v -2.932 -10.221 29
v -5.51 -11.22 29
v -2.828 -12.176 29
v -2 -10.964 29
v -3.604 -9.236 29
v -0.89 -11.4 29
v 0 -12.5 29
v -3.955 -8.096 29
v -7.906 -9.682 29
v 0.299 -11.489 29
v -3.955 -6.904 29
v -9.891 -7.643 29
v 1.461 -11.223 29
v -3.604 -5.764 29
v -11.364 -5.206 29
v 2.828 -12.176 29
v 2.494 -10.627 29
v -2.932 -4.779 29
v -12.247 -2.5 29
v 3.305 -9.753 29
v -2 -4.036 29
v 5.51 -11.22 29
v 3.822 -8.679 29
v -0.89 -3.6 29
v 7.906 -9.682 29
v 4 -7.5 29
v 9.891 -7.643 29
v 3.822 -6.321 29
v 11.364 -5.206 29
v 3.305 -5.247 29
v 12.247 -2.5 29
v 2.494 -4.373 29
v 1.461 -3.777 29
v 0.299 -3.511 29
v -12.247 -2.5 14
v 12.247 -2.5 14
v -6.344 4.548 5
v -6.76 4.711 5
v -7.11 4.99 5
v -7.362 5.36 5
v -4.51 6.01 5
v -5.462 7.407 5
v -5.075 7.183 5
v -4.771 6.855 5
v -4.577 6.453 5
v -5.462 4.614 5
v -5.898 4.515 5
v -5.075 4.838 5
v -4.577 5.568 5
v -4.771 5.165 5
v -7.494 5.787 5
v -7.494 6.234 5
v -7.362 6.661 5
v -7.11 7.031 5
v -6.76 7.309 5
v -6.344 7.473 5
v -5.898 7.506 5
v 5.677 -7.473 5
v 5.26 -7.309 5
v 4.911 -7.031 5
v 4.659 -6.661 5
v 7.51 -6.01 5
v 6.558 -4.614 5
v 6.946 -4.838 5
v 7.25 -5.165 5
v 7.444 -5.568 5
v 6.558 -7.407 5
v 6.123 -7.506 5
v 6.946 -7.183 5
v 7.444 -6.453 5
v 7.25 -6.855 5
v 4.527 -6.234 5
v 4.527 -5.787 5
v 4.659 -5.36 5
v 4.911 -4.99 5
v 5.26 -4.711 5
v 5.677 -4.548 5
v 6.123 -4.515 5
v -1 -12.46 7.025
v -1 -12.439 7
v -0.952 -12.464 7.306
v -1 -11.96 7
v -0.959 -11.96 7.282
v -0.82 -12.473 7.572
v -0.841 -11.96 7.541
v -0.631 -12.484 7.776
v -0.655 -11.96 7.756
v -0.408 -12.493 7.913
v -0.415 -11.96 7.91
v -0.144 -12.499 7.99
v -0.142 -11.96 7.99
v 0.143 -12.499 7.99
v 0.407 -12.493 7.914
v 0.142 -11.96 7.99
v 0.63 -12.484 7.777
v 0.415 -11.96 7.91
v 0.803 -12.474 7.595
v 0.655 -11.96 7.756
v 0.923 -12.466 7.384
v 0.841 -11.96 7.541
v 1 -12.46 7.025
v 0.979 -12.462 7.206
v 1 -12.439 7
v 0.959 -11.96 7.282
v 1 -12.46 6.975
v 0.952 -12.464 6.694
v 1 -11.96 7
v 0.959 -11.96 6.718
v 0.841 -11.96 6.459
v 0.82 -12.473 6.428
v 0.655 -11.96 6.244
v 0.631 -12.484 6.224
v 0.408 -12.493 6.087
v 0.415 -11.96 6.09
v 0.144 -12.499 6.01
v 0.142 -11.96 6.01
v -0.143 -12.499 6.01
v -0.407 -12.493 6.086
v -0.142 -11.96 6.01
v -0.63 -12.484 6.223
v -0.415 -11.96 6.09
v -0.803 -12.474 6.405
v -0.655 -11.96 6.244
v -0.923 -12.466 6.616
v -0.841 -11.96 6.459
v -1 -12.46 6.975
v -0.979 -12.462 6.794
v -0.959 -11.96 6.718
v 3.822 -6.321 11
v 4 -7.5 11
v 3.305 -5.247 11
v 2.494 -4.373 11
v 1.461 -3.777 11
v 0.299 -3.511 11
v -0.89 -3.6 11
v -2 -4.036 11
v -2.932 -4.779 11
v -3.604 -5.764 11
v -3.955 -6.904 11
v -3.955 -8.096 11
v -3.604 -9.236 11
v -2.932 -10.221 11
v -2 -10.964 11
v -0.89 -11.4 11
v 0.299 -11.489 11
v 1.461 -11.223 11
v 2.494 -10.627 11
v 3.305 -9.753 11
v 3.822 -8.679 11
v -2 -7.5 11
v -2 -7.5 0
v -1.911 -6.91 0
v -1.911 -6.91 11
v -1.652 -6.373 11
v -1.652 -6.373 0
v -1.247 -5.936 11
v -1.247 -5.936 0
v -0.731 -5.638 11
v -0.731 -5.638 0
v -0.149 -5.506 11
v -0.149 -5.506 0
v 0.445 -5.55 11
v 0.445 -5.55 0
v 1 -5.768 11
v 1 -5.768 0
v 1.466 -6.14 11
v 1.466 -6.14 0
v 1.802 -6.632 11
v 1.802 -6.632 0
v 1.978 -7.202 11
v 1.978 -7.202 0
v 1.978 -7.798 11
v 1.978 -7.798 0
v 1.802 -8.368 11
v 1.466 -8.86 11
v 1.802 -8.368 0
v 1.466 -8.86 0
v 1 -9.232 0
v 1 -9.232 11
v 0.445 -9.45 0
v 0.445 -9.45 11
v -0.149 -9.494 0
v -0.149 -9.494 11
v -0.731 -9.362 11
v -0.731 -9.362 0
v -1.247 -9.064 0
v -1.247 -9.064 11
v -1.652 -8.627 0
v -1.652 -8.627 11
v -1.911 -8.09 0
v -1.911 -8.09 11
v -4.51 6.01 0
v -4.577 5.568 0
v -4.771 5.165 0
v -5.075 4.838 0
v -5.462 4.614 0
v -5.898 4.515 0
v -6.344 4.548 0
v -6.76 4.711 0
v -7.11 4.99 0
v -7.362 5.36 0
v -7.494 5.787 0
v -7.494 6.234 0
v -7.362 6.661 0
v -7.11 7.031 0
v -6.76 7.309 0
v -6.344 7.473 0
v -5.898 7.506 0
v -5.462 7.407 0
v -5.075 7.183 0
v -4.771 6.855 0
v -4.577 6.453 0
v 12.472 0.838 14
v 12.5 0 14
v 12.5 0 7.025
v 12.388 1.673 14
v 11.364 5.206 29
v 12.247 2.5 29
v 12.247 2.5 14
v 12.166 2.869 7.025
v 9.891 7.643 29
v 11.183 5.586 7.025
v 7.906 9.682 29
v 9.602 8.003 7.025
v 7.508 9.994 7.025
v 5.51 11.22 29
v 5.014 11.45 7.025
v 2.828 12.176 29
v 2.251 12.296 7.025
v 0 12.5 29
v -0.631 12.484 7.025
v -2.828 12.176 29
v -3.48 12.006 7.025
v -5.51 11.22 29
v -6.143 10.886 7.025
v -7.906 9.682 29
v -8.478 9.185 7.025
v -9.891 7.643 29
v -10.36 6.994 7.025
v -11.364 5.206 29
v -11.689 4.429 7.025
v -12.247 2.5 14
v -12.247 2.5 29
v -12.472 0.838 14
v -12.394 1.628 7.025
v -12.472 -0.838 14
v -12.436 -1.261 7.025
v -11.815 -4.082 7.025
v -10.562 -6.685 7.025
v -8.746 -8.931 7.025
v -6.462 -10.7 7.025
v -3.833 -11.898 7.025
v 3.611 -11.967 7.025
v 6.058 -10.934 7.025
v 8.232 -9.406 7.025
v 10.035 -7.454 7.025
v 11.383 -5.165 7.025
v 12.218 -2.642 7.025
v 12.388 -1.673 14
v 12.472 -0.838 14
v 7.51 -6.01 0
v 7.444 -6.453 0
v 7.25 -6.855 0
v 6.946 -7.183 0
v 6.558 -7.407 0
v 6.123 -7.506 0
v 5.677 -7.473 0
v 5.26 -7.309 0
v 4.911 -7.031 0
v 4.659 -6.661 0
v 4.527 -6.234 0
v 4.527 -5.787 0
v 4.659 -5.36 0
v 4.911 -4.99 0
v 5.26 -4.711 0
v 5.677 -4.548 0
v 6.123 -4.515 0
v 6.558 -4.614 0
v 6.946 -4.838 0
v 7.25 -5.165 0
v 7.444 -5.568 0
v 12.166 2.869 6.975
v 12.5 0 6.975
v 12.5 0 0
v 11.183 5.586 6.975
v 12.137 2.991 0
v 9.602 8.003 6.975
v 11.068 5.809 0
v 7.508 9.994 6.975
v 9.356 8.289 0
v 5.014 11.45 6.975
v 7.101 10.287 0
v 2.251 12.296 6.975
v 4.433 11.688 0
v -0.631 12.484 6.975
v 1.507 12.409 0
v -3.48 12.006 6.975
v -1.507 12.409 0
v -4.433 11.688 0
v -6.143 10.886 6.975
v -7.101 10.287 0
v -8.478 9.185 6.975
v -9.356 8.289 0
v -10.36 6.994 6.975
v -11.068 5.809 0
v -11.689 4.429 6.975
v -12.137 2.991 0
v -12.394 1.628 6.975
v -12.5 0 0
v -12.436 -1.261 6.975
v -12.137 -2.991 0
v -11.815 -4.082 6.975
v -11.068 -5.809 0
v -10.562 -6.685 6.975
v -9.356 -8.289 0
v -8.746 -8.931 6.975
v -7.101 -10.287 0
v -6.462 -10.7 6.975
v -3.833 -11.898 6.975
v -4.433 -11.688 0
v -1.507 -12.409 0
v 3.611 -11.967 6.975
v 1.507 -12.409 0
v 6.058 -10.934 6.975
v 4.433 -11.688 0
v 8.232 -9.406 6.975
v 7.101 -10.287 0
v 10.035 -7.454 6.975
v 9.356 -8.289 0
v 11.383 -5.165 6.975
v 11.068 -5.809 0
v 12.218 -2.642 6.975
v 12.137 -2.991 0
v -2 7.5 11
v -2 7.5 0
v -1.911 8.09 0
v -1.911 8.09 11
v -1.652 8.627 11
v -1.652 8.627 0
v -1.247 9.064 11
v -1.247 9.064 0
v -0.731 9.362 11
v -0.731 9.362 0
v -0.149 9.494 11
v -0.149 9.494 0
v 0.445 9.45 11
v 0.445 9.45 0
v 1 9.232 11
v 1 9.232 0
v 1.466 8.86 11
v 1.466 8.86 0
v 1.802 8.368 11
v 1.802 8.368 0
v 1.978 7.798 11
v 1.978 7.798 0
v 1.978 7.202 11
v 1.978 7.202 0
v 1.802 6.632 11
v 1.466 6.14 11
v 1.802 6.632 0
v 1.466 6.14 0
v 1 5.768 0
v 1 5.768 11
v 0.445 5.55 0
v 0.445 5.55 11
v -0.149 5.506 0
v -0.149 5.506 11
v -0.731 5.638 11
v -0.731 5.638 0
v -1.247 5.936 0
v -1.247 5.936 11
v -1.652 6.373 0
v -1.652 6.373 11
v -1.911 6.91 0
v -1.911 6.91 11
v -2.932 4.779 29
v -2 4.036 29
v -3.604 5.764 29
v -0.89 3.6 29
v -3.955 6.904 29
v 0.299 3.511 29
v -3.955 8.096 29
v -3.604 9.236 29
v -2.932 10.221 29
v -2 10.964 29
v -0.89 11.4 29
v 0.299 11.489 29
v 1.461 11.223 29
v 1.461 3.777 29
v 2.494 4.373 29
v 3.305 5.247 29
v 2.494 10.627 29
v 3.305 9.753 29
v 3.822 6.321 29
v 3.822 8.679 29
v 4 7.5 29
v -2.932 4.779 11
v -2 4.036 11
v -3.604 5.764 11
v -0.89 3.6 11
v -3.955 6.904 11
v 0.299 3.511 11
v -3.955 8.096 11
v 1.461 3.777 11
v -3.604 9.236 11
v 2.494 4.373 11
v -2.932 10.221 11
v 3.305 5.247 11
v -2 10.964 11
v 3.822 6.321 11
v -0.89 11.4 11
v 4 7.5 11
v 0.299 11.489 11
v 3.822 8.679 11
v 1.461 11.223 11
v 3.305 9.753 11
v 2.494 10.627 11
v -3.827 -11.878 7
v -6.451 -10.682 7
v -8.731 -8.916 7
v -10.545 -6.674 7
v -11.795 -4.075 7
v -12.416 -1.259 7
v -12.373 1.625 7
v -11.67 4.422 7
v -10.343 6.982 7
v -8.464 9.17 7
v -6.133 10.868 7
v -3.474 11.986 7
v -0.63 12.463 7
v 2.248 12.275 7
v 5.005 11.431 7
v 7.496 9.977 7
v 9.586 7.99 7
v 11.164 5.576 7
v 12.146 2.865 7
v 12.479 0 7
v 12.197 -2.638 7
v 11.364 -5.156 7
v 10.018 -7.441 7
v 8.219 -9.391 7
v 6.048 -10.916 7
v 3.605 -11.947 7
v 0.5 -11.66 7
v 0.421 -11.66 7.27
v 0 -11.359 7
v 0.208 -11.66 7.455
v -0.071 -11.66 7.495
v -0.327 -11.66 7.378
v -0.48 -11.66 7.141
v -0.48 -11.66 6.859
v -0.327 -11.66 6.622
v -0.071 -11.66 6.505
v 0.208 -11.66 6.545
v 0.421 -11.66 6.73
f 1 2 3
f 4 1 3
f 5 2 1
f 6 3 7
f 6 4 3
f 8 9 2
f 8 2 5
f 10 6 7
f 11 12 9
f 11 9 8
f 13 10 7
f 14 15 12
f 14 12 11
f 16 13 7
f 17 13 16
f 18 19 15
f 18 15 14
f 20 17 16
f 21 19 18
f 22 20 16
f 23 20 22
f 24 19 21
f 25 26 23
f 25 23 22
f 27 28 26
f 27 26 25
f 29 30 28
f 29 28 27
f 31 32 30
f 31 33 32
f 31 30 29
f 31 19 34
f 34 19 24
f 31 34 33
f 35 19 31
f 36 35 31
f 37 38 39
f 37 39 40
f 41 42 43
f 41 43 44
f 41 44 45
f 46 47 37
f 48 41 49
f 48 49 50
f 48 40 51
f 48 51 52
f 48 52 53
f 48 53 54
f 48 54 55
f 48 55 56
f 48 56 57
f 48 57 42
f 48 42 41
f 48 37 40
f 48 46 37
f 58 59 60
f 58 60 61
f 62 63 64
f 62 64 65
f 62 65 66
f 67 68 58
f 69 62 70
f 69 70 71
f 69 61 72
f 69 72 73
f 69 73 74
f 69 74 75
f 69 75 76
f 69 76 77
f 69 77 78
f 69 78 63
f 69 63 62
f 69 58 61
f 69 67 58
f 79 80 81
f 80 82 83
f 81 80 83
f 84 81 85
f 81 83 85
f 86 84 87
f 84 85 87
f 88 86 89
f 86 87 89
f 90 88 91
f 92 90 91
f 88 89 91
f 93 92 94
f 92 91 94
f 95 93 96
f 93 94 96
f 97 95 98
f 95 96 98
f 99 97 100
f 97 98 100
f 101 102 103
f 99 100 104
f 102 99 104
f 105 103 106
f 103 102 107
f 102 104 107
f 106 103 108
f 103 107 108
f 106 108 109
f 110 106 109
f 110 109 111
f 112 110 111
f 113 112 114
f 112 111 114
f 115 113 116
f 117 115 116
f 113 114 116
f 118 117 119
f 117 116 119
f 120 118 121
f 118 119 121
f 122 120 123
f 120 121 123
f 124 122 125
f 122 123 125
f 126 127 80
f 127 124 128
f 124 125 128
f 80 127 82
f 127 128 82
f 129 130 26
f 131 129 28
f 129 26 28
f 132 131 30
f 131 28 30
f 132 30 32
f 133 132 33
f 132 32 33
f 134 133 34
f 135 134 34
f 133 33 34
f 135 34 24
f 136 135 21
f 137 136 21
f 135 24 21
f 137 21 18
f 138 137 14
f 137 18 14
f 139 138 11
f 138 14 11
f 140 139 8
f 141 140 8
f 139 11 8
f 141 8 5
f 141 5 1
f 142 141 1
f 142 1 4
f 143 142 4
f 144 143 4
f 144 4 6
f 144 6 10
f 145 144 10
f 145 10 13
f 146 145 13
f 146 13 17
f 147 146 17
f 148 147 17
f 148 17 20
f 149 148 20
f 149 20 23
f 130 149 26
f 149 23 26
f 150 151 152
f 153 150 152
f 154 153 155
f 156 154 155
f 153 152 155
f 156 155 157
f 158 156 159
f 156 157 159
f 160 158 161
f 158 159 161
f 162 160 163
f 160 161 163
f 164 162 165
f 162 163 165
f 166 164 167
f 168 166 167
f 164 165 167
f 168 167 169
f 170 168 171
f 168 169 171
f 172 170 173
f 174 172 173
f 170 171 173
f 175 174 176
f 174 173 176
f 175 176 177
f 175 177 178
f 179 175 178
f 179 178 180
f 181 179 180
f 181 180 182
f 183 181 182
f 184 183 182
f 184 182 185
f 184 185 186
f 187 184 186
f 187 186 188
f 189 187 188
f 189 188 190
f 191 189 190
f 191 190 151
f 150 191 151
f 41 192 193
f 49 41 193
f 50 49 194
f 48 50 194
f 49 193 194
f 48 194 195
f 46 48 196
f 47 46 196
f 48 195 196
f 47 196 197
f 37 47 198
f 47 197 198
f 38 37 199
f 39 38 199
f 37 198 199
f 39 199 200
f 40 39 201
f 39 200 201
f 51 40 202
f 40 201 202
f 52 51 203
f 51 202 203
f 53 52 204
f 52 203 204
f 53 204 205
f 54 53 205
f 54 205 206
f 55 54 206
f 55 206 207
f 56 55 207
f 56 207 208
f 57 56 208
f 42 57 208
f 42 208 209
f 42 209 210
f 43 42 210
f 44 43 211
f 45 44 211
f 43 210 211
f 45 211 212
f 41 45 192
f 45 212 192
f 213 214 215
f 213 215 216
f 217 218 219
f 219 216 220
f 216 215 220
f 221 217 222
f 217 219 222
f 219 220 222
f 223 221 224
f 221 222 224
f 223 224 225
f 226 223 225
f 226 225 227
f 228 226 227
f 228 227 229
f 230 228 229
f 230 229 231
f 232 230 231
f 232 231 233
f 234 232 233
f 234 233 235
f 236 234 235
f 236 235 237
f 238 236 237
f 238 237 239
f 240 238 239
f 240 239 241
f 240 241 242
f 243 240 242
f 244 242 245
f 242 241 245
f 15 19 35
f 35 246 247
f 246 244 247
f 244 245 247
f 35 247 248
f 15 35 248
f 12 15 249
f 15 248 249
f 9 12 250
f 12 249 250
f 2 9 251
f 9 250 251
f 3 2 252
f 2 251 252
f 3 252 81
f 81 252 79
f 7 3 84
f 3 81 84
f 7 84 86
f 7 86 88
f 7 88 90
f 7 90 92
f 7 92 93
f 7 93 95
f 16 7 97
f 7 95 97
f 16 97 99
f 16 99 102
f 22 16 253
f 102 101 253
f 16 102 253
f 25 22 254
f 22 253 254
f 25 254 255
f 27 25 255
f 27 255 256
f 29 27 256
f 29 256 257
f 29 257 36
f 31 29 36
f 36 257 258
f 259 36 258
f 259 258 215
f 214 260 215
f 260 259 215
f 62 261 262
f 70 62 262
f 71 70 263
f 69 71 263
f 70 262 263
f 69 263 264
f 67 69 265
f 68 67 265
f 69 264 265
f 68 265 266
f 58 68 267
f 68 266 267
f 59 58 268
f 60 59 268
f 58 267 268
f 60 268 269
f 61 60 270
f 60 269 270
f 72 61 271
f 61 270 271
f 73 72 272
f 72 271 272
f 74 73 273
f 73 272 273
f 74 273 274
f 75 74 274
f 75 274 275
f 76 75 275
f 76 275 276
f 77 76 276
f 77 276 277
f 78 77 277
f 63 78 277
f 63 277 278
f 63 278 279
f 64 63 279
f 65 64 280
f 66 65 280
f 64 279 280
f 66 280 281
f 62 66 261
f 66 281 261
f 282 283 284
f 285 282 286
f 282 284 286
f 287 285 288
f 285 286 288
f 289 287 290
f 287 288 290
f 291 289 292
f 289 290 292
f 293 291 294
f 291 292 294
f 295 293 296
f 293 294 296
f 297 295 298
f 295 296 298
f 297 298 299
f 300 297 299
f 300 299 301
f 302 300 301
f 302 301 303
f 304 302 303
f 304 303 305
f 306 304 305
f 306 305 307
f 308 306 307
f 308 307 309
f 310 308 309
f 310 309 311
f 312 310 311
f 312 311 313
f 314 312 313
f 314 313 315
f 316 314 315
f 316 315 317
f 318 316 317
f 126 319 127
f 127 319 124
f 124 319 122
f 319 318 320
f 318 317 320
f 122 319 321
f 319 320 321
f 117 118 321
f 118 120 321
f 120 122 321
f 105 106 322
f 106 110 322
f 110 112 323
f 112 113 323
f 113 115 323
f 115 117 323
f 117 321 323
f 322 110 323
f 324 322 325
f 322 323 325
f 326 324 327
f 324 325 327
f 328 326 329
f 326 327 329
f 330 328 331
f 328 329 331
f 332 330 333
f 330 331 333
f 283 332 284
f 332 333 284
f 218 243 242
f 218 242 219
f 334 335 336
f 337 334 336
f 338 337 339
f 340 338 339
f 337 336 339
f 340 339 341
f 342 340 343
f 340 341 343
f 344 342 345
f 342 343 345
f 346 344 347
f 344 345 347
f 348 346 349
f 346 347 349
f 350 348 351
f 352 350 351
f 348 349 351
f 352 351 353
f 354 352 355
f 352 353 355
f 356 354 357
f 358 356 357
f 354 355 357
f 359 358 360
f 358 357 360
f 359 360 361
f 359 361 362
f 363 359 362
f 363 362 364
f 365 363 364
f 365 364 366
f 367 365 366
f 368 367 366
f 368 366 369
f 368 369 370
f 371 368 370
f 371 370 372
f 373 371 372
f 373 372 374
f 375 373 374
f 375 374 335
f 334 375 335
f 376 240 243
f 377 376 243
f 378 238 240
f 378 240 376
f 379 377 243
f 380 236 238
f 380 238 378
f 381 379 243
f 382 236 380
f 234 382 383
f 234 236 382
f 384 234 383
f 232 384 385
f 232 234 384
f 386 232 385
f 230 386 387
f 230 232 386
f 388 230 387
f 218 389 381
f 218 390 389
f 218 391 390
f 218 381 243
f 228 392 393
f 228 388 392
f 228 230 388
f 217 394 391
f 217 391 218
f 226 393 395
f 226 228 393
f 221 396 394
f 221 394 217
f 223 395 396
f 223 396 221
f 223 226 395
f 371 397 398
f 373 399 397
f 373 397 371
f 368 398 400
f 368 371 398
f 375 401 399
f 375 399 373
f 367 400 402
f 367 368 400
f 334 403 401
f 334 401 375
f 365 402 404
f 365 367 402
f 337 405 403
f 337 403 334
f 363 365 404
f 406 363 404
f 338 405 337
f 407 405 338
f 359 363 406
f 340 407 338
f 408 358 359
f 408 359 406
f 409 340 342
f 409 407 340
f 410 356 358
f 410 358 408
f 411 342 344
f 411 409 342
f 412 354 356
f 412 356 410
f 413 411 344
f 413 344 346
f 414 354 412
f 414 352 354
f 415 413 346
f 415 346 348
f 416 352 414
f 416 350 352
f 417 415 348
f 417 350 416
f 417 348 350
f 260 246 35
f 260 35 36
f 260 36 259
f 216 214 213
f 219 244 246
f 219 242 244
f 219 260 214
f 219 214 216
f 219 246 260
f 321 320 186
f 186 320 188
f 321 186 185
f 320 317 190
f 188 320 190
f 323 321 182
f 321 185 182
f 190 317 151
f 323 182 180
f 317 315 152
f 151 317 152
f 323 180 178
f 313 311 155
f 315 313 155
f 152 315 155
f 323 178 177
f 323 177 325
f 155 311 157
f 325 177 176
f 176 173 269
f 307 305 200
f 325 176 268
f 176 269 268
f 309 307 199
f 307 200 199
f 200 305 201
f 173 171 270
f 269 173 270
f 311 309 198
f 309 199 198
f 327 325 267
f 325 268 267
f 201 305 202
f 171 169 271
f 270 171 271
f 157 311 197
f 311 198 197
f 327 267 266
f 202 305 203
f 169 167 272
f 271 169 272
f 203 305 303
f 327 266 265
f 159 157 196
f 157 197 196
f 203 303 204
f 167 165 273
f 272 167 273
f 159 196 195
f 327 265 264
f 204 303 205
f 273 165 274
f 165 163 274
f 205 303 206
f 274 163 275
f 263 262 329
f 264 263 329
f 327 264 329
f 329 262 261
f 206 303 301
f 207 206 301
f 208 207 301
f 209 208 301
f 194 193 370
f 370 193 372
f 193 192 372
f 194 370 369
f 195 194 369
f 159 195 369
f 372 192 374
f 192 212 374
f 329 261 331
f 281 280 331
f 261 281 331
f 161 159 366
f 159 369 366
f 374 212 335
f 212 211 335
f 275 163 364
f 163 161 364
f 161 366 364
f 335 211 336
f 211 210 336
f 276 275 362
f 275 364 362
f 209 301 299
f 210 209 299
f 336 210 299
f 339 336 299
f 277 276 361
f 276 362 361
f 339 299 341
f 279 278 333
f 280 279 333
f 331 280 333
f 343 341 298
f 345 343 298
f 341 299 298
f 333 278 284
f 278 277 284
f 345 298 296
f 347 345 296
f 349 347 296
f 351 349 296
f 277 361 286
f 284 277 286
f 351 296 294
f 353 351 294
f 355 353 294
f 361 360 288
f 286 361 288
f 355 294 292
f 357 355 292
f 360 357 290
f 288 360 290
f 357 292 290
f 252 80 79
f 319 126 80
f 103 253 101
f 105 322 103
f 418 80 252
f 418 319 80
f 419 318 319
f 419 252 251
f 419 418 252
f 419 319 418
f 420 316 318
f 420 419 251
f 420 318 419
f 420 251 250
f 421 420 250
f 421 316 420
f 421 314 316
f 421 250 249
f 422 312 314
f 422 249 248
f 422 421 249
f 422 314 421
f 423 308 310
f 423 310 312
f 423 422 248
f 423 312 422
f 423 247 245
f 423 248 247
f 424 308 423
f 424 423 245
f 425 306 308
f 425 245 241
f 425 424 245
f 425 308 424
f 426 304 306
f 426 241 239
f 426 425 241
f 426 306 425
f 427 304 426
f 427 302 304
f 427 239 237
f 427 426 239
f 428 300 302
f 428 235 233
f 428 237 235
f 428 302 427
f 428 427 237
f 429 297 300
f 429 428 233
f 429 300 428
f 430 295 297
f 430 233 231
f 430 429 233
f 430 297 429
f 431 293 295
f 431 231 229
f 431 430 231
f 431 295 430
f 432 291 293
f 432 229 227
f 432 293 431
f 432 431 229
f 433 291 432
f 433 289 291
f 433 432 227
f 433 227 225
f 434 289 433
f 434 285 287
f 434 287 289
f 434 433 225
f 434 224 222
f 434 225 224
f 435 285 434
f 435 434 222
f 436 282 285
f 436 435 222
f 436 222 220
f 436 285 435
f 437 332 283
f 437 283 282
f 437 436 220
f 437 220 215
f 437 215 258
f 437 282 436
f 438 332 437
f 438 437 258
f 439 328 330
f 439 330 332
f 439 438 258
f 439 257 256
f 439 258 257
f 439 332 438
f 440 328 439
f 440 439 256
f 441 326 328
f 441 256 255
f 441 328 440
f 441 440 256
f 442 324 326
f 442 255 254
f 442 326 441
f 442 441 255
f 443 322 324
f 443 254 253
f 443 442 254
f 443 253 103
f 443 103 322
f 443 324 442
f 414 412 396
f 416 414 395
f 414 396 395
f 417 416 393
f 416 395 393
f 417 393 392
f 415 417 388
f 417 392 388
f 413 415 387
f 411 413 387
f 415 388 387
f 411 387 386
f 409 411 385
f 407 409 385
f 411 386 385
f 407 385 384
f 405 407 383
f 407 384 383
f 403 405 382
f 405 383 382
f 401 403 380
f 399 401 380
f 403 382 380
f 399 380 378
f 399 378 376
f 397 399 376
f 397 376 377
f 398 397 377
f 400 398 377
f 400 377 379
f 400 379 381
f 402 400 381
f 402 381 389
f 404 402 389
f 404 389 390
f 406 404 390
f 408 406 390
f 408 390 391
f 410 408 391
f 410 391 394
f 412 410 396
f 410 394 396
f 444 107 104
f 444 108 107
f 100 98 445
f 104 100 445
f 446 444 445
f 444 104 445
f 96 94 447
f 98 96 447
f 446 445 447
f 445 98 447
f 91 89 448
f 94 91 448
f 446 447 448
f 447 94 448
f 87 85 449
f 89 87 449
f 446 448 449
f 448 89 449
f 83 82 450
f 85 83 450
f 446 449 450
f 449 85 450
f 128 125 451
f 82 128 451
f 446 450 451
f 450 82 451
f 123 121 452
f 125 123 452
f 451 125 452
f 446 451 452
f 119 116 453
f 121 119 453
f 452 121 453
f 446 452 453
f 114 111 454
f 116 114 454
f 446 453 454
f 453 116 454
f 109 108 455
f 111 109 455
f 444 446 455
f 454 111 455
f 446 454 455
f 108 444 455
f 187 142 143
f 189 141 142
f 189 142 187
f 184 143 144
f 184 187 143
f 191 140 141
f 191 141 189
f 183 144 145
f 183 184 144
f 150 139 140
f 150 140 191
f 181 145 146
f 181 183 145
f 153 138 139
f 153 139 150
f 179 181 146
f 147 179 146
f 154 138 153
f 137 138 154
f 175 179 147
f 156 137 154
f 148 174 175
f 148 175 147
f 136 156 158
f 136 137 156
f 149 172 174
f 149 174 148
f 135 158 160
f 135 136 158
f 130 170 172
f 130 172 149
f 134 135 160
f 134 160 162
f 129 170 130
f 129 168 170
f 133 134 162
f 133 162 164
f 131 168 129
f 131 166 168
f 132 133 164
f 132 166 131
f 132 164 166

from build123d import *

# Parameters (mm, degrees)
F0_R      = 12.5
F1_DEPTH  = 29
F2_W      = 35.4545446894
F2_H      = 5
F3_DEPTH  = 15
F5_D      = 4
F4_R      = 4
F6_DEPTH  = 18
F9_D      = 2
F9_DEPTH  = 0.5
F9_START  = 0.0400643
F9_TIP    = 0.600860619
F10_R     = 0.025
F12_R     = 1.5
F13_DEPTH = 5


with BuildPart() as f1:
    # F0 (on Top) → F1 (new body)
    with BuildSketch(Plane.XY):
        Circle(F0_R)
    extrude(amount=F1_DEPTH)

    # F2 (on face) → F3 (cut)
    with BuildSketch(Plane.XY.offset(29)):
        with Locations((4.610654898, 0)):
            Rectangle(F2_W, F2_H)
    extrude(amount=-F3_DEPTH, mode=Mode.SUBTRACT)

    # F5 (through all)
    with Locations(Plane.XY.offset(29)):
        with Locations((0, 7.5), (0, -7.5)):
            Hole(F5_D / 2)

    # F4 (on face) → F6 (cut)
    with BuildSketch(Plane.XY.offset(29)):
        with Locations((0, 7.5)):
            Circle(F4_R)
        with Locations((0, -7.5)):
            Circle(F4_R)
    extrude(amount=-F6_DEPTH, mode=Mode.SUBTRACT)

    # F9
    # its depths count from where the whole tool has entered the part; down to there all is cleared
    with Locations(Plane.XZ.offset(12.5).offset(-F9_START)):
        with Locations((0, 7)):
            Hole(F9_D / 2, depth=F9_DEPTH)
            with Locations((0, 0, -(F9_DEPTH + F9_TIP / 2))):  # 118° drill point
                Cone(0, F9_D / 2, F9_TIP, mode=Mode.SUBTRACT)

    # F10 (on Front) → F11 (revolve, cut)
    with BuildSketch(Plane.XZ):
        with Locations((12.5041836873, 7)):
            Circle(F10_R)
    revolve(axis=Axis((0, 0, 4.1495896876), (0, 0, -1)), mode=Mode.SUBTRACT)

    # F12 (on face) → F13 (cut)
    with BuildSketch(Plane(origin=(0, 0, 0), x_dir=(1, 0, 0), z_dir=(0, 0, -1))):
        with Locations((6.0104076401, 6.0104076401)):
            Circle(F12_R)
        with Locations((-6.0104076401, -6.0104076401)):
            Circle(F12_R)
    extrude(amount=-F13_DEPTH, mode=Mode.SUBTRACT)


solid = f1.part
